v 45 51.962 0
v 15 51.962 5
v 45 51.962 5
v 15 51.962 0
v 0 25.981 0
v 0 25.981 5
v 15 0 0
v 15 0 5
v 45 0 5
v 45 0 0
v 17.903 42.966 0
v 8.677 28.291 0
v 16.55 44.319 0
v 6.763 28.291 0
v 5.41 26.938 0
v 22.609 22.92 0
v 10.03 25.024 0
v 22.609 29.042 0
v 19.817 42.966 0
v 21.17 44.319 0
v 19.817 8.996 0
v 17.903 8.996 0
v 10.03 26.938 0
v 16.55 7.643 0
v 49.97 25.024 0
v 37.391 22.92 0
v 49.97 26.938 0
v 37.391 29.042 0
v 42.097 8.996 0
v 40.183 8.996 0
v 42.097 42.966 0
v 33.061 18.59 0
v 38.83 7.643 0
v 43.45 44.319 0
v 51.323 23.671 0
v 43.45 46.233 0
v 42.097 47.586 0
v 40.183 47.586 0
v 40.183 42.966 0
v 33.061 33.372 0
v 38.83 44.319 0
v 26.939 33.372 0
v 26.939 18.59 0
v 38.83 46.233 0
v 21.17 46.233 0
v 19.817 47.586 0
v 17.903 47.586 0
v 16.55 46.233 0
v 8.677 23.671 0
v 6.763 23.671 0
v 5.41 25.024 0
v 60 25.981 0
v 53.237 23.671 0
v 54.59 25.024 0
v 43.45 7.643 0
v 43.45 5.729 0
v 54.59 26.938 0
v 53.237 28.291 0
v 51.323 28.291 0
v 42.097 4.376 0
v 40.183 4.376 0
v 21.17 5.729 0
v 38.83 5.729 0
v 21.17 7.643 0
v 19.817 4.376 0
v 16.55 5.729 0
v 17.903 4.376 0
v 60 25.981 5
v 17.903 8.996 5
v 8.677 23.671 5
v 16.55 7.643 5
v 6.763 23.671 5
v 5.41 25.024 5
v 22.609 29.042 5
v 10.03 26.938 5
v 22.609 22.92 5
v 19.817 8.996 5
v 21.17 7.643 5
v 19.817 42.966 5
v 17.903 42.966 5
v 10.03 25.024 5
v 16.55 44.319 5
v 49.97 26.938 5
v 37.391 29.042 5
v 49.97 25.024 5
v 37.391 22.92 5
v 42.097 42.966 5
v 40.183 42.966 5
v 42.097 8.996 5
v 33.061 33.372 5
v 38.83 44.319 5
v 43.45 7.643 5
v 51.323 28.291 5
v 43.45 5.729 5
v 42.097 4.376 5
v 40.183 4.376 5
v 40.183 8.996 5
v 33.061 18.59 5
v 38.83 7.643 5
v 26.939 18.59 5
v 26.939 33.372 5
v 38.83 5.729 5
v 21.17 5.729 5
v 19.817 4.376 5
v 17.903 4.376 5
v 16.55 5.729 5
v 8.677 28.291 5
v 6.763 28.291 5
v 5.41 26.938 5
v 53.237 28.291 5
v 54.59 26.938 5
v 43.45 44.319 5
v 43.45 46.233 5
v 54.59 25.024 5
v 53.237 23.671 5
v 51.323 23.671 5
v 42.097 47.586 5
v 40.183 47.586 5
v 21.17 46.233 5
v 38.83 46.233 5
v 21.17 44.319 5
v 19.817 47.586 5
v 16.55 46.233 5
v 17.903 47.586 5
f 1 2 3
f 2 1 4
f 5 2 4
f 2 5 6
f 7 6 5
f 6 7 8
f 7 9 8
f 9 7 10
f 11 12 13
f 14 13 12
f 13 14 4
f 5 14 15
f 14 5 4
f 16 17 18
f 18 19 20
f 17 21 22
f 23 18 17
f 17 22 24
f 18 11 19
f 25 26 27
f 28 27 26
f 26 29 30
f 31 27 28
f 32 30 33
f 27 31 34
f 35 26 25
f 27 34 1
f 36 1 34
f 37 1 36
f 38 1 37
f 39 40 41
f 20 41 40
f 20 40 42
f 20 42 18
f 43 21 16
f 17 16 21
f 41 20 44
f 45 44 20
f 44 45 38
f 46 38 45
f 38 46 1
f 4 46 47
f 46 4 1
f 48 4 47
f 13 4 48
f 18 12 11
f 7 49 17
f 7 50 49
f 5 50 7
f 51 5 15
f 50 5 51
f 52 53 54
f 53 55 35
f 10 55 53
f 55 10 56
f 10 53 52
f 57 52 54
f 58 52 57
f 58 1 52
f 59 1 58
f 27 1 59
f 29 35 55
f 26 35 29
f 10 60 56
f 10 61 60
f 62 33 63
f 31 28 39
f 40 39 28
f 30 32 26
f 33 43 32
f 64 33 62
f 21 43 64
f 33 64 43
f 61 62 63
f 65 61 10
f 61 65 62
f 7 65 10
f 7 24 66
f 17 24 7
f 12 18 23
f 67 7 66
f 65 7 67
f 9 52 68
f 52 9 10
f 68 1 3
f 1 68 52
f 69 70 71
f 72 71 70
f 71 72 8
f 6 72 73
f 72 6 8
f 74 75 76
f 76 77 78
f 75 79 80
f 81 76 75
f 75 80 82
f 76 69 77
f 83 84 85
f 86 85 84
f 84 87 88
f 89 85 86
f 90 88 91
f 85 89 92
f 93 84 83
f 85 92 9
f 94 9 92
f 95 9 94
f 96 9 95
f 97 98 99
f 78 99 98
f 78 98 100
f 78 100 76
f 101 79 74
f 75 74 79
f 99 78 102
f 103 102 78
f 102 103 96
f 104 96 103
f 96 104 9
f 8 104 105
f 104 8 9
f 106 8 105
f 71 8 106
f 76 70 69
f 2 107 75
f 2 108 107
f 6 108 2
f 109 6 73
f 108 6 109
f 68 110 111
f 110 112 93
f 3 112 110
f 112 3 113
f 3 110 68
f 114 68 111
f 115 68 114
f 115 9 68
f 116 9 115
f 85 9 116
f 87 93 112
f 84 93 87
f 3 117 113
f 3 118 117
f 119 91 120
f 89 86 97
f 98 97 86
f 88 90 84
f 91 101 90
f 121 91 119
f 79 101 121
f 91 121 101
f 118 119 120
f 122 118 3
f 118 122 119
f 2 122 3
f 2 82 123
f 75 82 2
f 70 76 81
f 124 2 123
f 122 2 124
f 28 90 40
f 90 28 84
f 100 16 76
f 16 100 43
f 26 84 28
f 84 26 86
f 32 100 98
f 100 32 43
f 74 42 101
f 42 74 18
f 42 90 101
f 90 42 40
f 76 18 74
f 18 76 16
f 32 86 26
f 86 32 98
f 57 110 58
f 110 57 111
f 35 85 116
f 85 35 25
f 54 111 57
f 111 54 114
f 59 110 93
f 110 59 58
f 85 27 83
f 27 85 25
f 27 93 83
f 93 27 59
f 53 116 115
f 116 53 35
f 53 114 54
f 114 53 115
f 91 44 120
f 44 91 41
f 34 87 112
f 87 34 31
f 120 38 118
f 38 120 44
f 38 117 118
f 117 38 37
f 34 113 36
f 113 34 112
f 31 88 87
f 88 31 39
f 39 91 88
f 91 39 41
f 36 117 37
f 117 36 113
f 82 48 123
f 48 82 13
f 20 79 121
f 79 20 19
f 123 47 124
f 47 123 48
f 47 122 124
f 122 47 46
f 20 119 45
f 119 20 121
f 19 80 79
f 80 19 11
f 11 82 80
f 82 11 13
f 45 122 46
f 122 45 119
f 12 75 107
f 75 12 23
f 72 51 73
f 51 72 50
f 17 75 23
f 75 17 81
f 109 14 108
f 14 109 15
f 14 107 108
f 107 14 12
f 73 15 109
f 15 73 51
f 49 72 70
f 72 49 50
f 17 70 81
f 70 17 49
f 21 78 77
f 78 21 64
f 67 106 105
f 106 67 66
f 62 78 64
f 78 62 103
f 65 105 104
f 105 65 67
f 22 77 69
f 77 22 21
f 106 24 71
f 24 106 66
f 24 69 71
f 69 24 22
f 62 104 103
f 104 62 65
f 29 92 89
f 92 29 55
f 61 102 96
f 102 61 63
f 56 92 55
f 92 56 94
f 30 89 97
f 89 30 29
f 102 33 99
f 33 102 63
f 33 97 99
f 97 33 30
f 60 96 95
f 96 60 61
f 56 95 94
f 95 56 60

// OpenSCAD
$fn = 32;

// ----------------------------------------------------------------------
// Polygon plate: 6-gon R30, 6 bolt windows
// ----------------------------------------------------------------------

// --- parameters (mm) ---
sides = 6;                // number of polygon sides
plate_r = 30;             // circumscribed radius of the polygon
bore_r = 8;               // centre bore radius
bolts = 6;                // number of bolt windows
ring_r = 22.28;           // bolt-circle radius
bolt_r = 2.5;             // bolt window radius
plate_t = 5;              // plate thickness, Z (extrusion height)

plate_d = 2 * plate_r;  // circumscribed diameter
bore_d = 2 * bore_r;  // centre bore diameter
bolt_d = 2 * bolt_r;  // bolt window diameter
ring_d = 2 * ring_r;  // bolt-circle diameter

profile = [[60, 25.981], [45, 51.962], [15, 51.962], [0, 25.981], [15, 0], [45, 0]];  // primary outline, 6 points, counter clockwise
void_1 = [[37.391, 29.042], [33.061, 33.372], [26.939, 33.372], [22.609, 29.042], [22.609, 22.92], [26.939, 18.59], [33.061, 18.59], [37.391, 22.92]];  // centre bore, 8 points
void_2 = [[54.59, 26.938], [53.237, 28.291], [51.323, 28.291], [49.97, 26.938], [49.97, 25.024], [51.323, 23.671], [53.237, 23.671], [54.59, 25.024]];  // bolt window 1, 8 points
void_3 = [[43.45, 46.233], [42.097, 47.586], [40.183, 47.586], [38.83, 46.233], [38.83, 44.319], [40.183, 42.966], [42.097, 42.966], [43.45, 44.319]];  // bolt window 2, 8 points
void_4 = [[21.17, 46.233], [19.817, 47.586], [17.903, 47.586], [16.55, 46.233], [16.55, 44.319], [17.903, 42.966], [19.817, 42.966], [21.17, 44.319]];  // bolt window 3, 8 points
void_5 = [[10.03, 26.938], [8.677, 28.291], [6.763, 28.291], [5.41, 26.938], [5.41, 25.024], [6.763, 23.671], [8.677, 23.671], [10.03, 25.024]];  // bolt window 4, 8 points
void_6 = [[21.17, 7.643], [19.817, 8.996], [17.903, 8.996], [16.55, 7.643], [16.55, 5.729], [17.903, 4.376], [19.817, 4.376], [21.17, 5.729]];  // bolt window 5, 8 points
void_7 = [[43.45, 7.643], [42.097, 8.996], [40.183, 8.996], [38.83, 7.643], [38.83, 5.729], [40.183, 4.376], [42.097, 4.376], [43.45, 5.729]];  // bolt window 6, 8 points

// --- the one profile operation ---
difference() {
  linear_extrude(height = plate_t) polygon(points = profile);
  translate([0, 0, -1])
    linear_extrude(height = plate_t + 2) polygon(points = void_1);
  translate([0, 0, -1])
    linear_extrude(height = plate_t + 2) polygon(points = void_2);
  translate([0, 0, -1])
    linear_extrude(height = plate_t + 2) polygon(points = void_3);
  translate([0, 0, -1])
    linear_extrude(height = plate_t + 2) polygon(points = void_4);
  translate([0, 0, -1])
    linear_extrude(height = plate_t + 2) polygon(points = void_5);
  translate([0, 0, -1])
    linear_extrude(height = plate_t + 2) polygon(points = void_6);
  translate([0, 0, -1])
    linear_extrude(height = plate_t + 2) polygon(points = void_7);
}
